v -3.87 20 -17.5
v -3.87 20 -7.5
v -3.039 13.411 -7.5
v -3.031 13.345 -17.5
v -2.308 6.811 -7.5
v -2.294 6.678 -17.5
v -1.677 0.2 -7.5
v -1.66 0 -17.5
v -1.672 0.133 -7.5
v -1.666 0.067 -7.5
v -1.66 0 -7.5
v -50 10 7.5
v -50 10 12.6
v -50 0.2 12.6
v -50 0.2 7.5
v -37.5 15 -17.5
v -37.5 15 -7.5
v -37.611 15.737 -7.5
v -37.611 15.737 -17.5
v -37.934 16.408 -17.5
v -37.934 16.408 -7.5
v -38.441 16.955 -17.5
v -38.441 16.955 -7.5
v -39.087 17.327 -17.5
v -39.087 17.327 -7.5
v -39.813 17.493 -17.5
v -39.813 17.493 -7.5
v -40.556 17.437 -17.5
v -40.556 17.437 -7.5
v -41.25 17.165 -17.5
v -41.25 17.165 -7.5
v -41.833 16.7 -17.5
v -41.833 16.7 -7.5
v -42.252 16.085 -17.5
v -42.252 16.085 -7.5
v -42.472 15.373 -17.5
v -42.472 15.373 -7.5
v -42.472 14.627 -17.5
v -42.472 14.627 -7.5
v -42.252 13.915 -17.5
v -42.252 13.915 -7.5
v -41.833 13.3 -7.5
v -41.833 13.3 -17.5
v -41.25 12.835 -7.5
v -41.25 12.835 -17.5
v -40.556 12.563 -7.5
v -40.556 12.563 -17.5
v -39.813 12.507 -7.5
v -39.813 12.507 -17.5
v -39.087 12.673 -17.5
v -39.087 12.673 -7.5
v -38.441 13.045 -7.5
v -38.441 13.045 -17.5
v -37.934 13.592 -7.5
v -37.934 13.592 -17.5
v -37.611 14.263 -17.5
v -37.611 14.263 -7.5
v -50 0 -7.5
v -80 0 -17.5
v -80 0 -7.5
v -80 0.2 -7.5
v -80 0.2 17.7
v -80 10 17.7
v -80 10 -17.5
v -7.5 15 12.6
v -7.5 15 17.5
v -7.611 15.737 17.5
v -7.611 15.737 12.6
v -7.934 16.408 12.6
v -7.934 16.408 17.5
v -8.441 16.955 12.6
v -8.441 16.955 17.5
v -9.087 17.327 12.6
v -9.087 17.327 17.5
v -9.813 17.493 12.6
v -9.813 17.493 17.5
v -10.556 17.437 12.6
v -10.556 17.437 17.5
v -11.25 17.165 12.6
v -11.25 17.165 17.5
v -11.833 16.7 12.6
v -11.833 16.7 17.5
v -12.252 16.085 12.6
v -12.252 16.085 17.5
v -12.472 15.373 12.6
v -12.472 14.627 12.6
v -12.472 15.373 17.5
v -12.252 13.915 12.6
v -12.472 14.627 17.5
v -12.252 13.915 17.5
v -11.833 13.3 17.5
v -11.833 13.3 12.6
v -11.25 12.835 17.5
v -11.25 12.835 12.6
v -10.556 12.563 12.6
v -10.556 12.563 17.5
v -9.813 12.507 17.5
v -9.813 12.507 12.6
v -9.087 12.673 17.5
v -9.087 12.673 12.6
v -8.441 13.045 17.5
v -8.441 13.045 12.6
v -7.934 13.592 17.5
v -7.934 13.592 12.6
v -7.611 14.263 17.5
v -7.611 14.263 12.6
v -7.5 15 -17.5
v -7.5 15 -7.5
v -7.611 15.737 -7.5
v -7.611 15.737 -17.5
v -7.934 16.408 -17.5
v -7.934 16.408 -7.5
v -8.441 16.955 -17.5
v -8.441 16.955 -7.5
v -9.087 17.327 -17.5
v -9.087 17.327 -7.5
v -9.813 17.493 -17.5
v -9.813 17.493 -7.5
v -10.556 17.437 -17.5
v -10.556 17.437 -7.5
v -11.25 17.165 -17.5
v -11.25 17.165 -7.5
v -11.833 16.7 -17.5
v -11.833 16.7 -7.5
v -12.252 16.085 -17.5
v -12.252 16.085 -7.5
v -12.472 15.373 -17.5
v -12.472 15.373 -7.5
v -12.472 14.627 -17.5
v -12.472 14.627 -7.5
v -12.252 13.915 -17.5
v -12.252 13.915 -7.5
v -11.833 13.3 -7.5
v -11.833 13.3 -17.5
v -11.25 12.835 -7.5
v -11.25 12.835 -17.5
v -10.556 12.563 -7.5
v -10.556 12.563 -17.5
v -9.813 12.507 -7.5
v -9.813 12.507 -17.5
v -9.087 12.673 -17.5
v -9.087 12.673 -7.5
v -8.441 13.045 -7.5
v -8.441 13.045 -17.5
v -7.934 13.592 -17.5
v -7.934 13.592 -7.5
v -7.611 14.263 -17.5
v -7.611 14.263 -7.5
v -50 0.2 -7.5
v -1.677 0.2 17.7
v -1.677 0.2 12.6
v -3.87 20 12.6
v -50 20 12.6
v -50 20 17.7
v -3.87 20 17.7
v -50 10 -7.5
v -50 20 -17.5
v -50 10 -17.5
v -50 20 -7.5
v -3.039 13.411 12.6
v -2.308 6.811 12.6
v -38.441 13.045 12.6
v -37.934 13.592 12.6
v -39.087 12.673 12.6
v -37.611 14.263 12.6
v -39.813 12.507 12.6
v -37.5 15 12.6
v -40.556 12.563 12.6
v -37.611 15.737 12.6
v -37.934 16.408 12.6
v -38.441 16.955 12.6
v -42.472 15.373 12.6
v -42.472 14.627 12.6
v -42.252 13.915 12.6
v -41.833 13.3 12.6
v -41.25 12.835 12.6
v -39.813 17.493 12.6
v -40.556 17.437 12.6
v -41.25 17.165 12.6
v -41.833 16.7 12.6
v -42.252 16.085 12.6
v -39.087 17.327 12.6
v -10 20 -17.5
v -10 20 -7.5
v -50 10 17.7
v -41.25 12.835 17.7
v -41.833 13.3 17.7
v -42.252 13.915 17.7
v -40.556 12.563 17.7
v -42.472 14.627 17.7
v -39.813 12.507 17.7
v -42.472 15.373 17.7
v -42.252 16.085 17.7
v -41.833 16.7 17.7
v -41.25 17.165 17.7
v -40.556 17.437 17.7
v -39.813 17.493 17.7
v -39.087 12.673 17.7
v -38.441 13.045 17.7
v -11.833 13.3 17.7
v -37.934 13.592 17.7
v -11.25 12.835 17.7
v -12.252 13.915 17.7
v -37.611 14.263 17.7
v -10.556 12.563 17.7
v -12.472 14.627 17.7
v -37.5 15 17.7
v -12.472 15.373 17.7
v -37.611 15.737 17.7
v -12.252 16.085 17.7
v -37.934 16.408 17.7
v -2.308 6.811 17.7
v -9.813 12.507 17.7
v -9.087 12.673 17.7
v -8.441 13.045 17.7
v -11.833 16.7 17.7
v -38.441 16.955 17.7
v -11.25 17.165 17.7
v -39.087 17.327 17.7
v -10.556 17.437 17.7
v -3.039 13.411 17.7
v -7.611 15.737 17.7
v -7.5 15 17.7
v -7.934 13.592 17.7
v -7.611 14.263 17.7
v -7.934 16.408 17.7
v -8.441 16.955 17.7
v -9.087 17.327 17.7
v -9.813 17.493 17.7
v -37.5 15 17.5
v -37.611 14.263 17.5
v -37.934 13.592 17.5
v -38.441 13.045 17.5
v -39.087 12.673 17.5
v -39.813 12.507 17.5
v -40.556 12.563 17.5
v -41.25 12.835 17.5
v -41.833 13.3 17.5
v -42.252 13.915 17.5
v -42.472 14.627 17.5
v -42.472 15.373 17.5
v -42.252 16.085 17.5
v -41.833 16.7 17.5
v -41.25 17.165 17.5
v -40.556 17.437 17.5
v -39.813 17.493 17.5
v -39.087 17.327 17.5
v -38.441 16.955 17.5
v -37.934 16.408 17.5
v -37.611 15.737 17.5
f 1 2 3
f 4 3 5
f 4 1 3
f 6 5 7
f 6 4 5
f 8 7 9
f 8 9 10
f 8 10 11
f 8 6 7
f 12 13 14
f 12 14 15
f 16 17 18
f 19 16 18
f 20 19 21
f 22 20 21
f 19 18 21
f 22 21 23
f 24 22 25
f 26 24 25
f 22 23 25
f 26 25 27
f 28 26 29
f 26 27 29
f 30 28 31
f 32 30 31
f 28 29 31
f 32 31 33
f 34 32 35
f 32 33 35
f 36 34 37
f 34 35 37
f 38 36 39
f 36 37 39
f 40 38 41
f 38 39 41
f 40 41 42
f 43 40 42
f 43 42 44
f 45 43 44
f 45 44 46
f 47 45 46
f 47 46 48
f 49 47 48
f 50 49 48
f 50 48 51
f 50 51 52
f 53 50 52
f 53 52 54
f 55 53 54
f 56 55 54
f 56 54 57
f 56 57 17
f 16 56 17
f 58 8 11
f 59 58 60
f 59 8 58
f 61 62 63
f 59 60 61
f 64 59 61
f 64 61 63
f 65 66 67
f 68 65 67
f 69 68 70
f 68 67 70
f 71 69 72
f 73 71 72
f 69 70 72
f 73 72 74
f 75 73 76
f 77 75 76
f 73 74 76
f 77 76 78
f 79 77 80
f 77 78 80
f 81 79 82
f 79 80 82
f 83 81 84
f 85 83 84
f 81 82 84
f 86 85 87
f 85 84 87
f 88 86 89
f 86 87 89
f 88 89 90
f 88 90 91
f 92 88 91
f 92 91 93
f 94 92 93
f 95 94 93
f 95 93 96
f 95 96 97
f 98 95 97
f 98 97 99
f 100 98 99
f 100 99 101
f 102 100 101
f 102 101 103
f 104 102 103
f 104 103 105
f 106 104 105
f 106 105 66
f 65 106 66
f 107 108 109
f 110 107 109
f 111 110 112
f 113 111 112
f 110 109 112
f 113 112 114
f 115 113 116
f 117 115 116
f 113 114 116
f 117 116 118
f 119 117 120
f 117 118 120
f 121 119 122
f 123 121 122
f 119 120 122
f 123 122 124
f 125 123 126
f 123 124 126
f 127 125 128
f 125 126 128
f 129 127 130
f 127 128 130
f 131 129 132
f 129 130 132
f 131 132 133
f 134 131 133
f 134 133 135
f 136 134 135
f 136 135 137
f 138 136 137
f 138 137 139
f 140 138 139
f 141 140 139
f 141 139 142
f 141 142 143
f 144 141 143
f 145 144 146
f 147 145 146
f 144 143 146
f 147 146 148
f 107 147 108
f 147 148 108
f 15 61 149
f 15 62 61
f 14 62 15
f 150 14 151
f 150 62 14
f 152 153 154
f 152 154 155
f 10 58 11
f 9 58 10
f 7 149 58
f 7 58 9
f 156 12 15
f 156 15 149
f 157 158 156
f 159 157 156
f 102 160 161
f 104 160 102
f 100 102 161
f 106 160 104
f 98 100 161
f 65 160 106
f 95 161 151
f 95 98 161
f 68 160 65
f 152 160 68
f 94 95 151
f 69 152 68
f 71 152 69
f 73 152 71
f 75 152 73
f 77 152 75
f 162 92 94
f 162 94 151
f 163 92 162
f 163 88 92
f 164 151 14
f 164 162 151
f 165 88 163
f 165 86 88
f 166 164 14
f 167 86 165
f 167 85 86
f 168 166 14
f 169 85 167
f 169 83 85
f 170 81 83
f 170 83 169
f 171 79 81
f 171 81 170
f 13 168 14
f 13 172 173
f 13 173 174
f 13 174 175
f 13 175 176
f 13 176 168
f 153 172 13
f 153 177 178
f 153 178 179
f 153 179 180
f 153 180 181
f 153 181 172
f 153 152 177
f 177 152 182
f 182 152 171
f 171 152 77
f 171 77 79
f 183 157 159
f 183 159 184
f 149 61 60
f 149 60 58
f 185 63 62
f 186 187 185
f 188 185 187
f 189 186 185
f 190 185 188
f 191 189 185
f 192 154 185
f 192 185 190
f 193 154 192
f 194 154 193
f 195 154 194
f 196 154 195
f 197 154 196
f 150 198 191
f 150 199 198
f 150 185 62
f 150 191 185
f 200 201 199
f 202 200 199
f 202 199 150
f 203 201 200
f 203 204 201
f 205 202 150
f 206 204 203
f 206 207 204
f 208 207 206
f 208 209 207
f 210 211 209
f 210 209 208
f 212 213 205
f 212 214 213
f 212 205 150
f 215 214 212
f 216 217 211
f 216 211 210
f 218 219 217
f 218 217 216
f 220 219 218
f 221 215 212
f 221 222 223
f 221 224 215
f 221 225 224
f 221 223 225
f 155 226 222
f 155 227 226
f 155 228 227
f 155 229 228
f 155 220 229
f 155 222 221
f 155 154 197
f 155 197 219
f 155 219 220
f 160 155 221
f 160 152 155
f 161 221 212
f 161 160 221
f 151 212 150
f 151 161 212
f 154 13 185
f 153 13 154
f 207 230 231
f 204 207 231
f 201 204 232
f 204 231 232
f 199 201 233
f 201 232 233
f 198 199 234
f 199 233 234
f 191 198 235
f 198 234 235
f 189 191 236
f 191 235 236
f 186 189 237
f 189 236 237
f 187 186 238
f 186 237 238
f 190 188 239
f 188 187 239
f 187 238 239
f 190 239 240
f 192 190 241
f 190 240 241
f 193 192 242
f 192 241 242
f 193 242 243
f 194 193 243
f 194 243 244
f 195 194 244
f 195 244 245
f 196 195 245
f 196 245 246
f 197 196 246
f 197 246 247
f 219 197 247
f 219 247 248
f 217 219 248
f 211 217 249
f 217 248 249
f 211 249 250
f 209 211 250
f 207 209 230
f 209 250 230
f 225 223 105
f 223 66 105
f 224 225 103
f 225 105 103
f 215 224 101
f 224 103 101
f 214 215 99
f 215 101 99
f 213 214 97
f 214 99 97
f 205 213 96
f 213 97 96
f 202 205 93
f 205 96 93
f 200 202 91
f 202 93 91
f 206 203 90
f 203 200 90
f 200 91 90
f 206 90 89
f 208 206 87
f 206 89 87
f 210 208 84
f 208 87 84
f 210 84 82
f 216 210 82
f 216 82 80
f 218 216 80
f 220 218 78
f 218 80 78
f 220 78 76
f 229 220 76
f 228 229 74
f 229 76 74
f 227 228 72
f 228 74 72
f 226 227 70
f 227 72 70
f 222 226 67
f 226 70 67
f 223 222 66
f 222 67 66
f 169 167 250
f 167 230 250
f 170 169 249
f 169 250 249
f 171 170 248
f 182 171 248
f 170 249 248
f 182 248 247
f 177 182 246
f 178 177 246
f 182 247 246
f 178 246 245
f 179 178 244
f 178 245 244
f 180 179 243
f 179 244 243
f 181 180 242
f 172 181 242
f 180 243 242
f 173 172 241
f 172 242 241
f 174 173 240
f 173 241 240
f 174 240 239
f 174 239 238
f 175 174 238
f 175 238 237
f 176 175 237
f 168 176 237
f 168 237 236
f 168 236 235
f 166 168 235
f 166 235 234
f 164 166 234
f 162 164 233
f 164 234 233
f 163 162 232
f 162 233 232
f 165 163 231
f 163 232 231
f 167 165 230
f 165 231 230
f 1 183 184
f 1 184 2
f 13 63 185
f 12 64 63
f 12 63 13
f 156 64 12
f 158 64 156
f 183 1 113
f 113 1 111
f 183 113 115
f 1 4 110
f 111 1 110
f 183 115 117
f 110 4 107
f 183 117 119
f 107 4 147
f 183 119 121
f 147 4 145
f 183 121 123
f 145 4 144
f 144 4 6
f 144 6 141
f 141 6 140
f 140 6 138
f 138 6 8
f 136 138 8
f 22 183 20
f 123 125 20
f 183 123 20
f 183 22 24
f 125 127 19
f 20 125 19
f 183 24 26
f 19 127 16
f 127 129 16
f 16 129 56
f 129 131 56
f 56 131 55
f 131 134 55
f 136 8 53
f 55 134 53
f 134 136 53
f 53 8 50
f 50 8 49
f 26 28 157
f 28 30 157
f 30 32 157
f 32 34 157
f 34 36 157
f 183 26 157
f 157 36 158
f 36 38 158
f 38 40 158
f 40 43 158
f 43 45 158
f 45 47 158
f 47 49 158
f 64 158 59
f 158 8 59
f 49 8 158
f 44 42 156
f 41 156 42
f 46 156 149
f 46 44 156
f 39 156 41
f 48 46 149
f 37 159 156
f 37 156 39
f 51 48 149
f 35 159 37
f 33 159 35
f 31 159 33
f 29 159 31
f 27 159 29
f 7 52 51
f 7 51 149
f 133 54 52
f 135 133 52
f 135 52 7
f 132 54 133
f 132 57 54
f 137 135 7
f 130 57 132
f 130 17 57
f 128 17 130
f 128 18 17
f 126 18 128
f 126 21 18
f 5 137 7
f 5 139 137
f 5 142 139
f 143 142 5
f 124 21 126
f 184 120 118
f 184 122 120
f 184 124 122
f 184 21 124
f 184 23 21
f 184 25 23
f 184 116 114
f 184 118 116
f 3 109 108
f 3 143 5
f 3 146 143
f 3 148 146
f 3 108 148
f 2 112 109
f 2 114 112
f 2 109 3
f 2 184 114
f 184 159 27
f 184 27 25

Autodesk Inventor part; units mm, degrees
ref_plane "YZ Plane" through (0, 0, 0) normal (1, 0, 0) x (0, 1, 0)
ref_plane "XZ Plane" through (0, 0, 0) normal (0, 1, 0) x (-1, 0, 0)
ref_plane "XY Plane" through (0, 0, 0) normal (0, 0, 1) x (1, 0, 0)
sketch "Sketch1" plane through (0, 0, 0) normal (0, 1, 0) x (-1, 0, 0)
  line L0 (55, 48.2) -> (-10.0469, 48.2)
  line L1 (55, -48.2) -> (55, 48.2)
  line L2 (55, 48.2) -> (-55, -48.2) construction
  line L3 (-55, 48.2) -> (55, -48.2) construction
  arc A0 (-10.0469, 48.2) -> (-10.0469, -48.2) centre (425.3935, 0) ccw
  line L4 (-12.7065, -11.1355) -> (-12.7065, 11.1355)
  line L5 (55, -48.2) -> (-10.0469, -48.2)
  point P0 (0, 0)
  dimension "d82" = 876.2
  dimension "d83" = 425.3935
  dimension "d85" = 96.4
  dimension "d86" = 48.2
  dimension "d87" = 55
  dimension "d88" = 67.7065
extrude "Extrusion1" add sketch "Sketch1" along normal blind 10
sketch "Sketch2" plane through (0, 10, 0) normal (0, 1, 0) x (1, 0, 0)
  circle A0 centre (40, 43.2) radius 2
  circle A1 centre (0, 43.2) radius 2
  circle A2 centre (-40, 43.2) radius 2
  line L0 (55, -48.2) -> (55, 48.2) projected
  line L1 (-55, 48.2) -> (-55, -48.2) projected
  line L2 (55, 48.2) -> (-55, 48.2) projected
  circle A3 centre (40, -43.2) radius 2
  circle A4 centre (-22.4766, -43.2) radius 2
  circle A5 centre (-40, -43.2) radius 2
  line L3 (-55, -48.2) -> (10.0469, -48.2) projected
  point P0 (0, 0)
  point P1 (-22.4766, -48.2)
  dimension "d4" = 15
  dimension "d5" = 15
  dimension "d6" = 4
  dimension "d7" = 4
  dimension "d8" = 4
  dimension "d9" = 5
  dimension "d10" = 5
  dimension "d11" = 5
  dimension "d12" = 4
  dimension "d13" = 4
  dimension "d14" = 4
  dimension "d15" = 5
  dimension "d16" = 5
  dimension "d17" = 5
  dimension "d25" = 15
  dimension "d26" = 15
hole "Hole1" at (40, 10, -43.2) at (0, 10, -43.2) at (-40, 10, -43.2) at (-40, 10, 43.2) at (-22.4766, 10, 43.2) at (40, 10, 43.2) direction (0, -1, 0) diameter 3 end through all
sketch "Sketch5" plane through (0, 0, 0) normal (0, -1, 0) x (1, 0, 0)
  point P0 (0, 0)
sketch "Sketch6" plane through (-55, 0, -48.2) normal (-1, 0, 0) x (0, 0, 1)
  line L0 (96.4, 0) -> (96.4, 10) projected
  line L1 (96.4, 0) -> (0, 0) projected
  line L2 (96.4, 10) -> (0, 10)
  line L3 (0, 10) -> (0, 0)
  line L4 (0, 0) -> (96.4, 0)
  line L5 (96.4, 0) -> (96.4, 10)
  point P0 (48.2, 0)
extrude "Extrusion4" add sketch "Sketch6" along normal blind 10
sketch "Sketch7" plane through (0, 10, 0) normal (0, 1, 0) x (1, 0, 0)
  line L0 (0, -7.5) -> (-50, -7.5)
  line L1 (-50, -7.5) -> (-50, 7.5)
  line L2 (-50, 7.5) -> (0, 7.5)
  line L3 (0, 7.5) -> (0, -7.5)
  line L4 (0, -7.5) -> (-50, 7.5) construction
  line L5 (-50, -7.5) -> (0, 7.5) construction
  line L6 (-65, -48.2) -> (-65, 48.2) projected
  point P0 (0, 0)
  point P1 (-25, 0)
  dimension "d66" = 15
  dimension "d67" = 50
  dimension "d68" = 15
  dimension "d89" = 7.5
extrude "Extrusion5" cut sketch "Sketch7" against normal blind 10
sketch "Sketch8" plane through (0, 10, 0) normal (0, 1, 0) x (1, 0, 0)
  line L0 (-50, -7.5) -> (-50, 7.5) projected
  line L1 (-50, 7.5) -> (0, 7.5)
  line L2 (0, 7.5) -> (0, 17.5)
  line L3 (0, 17.5) -> (-50, 17.5)
  line L4 (-50, 17.5) -> (-50, 7.5)
  line L5 (0, -7.5) -> (-50, -7.5) projected
  line L6 (-50, -7.5) -> (0, -7.5)
  line L7 (0, -7.5) -> (0, -17.5)
  line L8 (0, -17.5) -> (-50, -17.5)
  line L9 (-50, -17.5) -> (-50, -7.5)
  point P0 (0, 0)
  point P1 (0, -7.5)
  dimension "d71" = 10
  dimension "d72" = 10
extrude "Extrusion6" add sketch "Sketch8" along normal blind 10
sketch "Sketch9" plane through (-50, 10, 17.5) normal (0, 0, 1) x (1, 0, 0)
  circle A0 centre (10, 5) radius 2.5
  circle A1 centre (40, 5) radius 2.5
  line L0 (0, 0) -> (0, 10) projected
  line L1 (50, 0) -> (50, 10) projected
  line L2 (0, 10) -> (50, 10) projected
  point P0 (50, -10)
  point P1 (0, 5)
  dimension "d75" = 5
  dimension "d77" = 10
  dimension "d79" = 5
  dimension "d105" = 40
  dimension "d106" = 5
  dimension "d107" = 5
extrude "Extrusion7" cut sketch "Sketch9" against normal through all
sketch "Sketch10" plane through (0, 10, 0) normal (0, 1, 0) x (1, 0, 0)
  line L0 (-65, -48.2) -> (10.0469, -48.2) projected
  arc A0 (10.0469, -48.2) -> (10.0469, 48.2) centre (-425.3935, 0) ccw projected
  line L1 (-65, -48.2) -> (14.2881, -48.2)
  line L2 (14.2881, -48.2) -> (14.2881, -21.9629)
  line L3 (-65, -17.5) -> (-65, -48.2)
  line L4 (10.0469, 48.2) -> (-65, 48.2) projected
  line L5 (-65, 48.2) -> (14.2881, 48.2)
  line L6 (14.2881, 48.2) -> (14.2881, 20.8403)
  line L7 (-65, 17.5) -> (-65, 48.2)
  line L8 (0, -48.2) -> (14.2881, -48.2)
  line L9 (14.2881, -48.2) -> (14.2881, 48.2)
  line L10 (14.2881, 48.2) -> (0, 48.2)
  line L11 (0, 17.5) -> (0, -17.5)
  line L12 (0, -17.5) -> (-65, -17.5)
  line L13 (0, 17.5) -> (-65, 17.5)
  line L14 (-50, -7.5) -> (-50, 7.5) projected
  point P0 (0, 0)
  point P1 (-50, 0)
  dimension "d90" = 35
  dimension "d91" = 65
  dimension "d92" = 17.5
extrude "Extrusion8" cut sketch "Sketch10" against normal blind 10 contours L3 L12 L11 L13 L7 L4 A0 L0
sketch "Sketch11" plane through (-65, 0, -48.2) normal (-1, 0, 0) x (0, 0, 1)
  line L0 (65.7, 10) -> (55.7, 10) projected
  line L1 (30.7, 0) -> (65.7, 0)
  line L2 (65.7, 0) -> (65.7, 10)
  line L3 (65.7, 10) -> (30.7, 10)
  line L4 (30.7, 10) -> (30.7, 0)
  point P0 (48.2, 0)
extrude "Extrusion9" add sketch "Sketch11" along normal blind 15
sketch "Sketch12" plane through (0, 20, 0) normal (0, 1, 0) x (1, 0, 0)
  line L0 (0, 17.5) -> (-50, 17.5) projected
  line L1 (0, -17.5) -> (-80, -17.5) projected
  line L2 (0, 17.5) -> (-5, 17.5)
  line L3 (-5, 17.5) -> (-5, -17.5)
  line L4 (-5, -17.5) -> (0, -17.5)
  line L5 (0, -17.5) -> (0, 17.5)
  point P0 (0, 0)
  dimension "d97" = 5
extrude "Extrusion10" add sketch "Sketch12" along normal blind 5
fillet "Fillet1" radius 5 2 edges at (-5, 20, -12.5) (-5, 20, 12.5)
sketch "Sketch13" plane through (-50, 10, 17.5) normal (0, 0, 1) x (1, 0, 0)
  circle A0 centre (40, 5) radius 2.5 projected
  circle A1 centre (10, 5) radius 2.5 projected
  line L0 (50, 15) -> (50, -10) projected
  line L1 (45, 15) -> (50, 15) projected
  arc A2 (40, 10) -> (45, 15) centre (40, 15) ccw projected
  line L2 (0, 10) -> (40, 10) projected
  line L3 (0, 0) -> (0, 10) projected
  line L4 (-30, 0) -> (0, 0) projected
  line L5 (-30, -10) -> (-30, 0) projected
  line L6 (50, -10) -> (-30, -10) projected
  point P0 (50, -10)
extrude "Extrusion11" add sketch "Sketch13" along normal blind 0.2
sketch "Sketch14" plane through (-50, 10, -17.5) normal (0, 0, -1) x (-1, 0, 0)
  arc A0 (-45, 17.9) -> (-50, -48.1) centre (388.1, -48.1) ccw
  line L0 (0, 0) -> (30, 0) projected
  line L1 (-50, 15) -> (-50, -10) projected
  line L2 (-50, 15) -> (-50, -48.1)
  line L3 (-50, 15) -> (-45, 17.9)
  point P0 (-50, -10)
  dimension "d108" = 876.2
  dimension "d109" = 48.1
  dimension "d110" = 438.1
extrude "Extrusion12" cut sketch "Sketch14" against normal through all
sketch "Sketch15" plane through (-50, 10, -17.5) normal (0, 0, -1) x (-1, 0, 0)
  line L0 (-40, 10) -> (0, 10) projected
  line L1 (-40, 10) -> (-53.6921, 10)
  arc A0 (-45, 15) -> (-40, 10) centre (-40, 15) ccw projected
  line L2 (-53.6921, 10) -> (-41.0966, 19.8783)
  line L3 (-41.0966, 19.8783) -> (-40, 10)
  point P0 (-50, -10)
extrude "Extrusion13" cut sketch "Sketch15" against normal through all
sketch "Sketch16" plane through (0, 20, 0) normal (0, 1, 0) x (1, 0, 0)
  line L0 (-3.8696, -7.5) -> (-3.8696, -17.7) projected
  line L1 (-50, -17.7) -> (-50, -7.5) projected
  line L2 (-50, -12.6) -> (-50, -7.5)
  line L3 (-3.8696, -7.5) -> (-50, -7.5) projected
  line L4 (-50, -7.5) -> (0.7476, -7.5)
  line L5 (0.7476, -7.5) -> (0.7476, -12.6)
  line L6 (0.7476, -12.6) -> (-50, -12.6)
  point P0 (0, 0)
  point P1 (-3.8696, -12.6)
extrude "Extrusion14" cut sketch "Sketch16" against normal through all
sketch "Sketch17" plane through (-50, 10, 17.7) normal (0, 0, 1) x (1, 0, 0)
  line L0 (-30, 0) -> (-30, -10) projected
  line L1 (-30, -9.8) -> (48.9645, -9.8)
  line L2 (48.9645, -9.8) -> (48.9645, -10.6043)
  line L3 (48.9645, -10.6043) -> (-30, -10.6043)
  line L4 (-30, -10.6043) -> (-30, -9.8)
  line L5 (-30, -10) -> (48.3401, -10) projected
  point P0 (50, -10)
  dimension "d117" = 0.2
extrude "Extrusion15" cut sketch "Sketch17" against normal blind 25.2
properties part number "ReleaseMec2.0SideMec"
